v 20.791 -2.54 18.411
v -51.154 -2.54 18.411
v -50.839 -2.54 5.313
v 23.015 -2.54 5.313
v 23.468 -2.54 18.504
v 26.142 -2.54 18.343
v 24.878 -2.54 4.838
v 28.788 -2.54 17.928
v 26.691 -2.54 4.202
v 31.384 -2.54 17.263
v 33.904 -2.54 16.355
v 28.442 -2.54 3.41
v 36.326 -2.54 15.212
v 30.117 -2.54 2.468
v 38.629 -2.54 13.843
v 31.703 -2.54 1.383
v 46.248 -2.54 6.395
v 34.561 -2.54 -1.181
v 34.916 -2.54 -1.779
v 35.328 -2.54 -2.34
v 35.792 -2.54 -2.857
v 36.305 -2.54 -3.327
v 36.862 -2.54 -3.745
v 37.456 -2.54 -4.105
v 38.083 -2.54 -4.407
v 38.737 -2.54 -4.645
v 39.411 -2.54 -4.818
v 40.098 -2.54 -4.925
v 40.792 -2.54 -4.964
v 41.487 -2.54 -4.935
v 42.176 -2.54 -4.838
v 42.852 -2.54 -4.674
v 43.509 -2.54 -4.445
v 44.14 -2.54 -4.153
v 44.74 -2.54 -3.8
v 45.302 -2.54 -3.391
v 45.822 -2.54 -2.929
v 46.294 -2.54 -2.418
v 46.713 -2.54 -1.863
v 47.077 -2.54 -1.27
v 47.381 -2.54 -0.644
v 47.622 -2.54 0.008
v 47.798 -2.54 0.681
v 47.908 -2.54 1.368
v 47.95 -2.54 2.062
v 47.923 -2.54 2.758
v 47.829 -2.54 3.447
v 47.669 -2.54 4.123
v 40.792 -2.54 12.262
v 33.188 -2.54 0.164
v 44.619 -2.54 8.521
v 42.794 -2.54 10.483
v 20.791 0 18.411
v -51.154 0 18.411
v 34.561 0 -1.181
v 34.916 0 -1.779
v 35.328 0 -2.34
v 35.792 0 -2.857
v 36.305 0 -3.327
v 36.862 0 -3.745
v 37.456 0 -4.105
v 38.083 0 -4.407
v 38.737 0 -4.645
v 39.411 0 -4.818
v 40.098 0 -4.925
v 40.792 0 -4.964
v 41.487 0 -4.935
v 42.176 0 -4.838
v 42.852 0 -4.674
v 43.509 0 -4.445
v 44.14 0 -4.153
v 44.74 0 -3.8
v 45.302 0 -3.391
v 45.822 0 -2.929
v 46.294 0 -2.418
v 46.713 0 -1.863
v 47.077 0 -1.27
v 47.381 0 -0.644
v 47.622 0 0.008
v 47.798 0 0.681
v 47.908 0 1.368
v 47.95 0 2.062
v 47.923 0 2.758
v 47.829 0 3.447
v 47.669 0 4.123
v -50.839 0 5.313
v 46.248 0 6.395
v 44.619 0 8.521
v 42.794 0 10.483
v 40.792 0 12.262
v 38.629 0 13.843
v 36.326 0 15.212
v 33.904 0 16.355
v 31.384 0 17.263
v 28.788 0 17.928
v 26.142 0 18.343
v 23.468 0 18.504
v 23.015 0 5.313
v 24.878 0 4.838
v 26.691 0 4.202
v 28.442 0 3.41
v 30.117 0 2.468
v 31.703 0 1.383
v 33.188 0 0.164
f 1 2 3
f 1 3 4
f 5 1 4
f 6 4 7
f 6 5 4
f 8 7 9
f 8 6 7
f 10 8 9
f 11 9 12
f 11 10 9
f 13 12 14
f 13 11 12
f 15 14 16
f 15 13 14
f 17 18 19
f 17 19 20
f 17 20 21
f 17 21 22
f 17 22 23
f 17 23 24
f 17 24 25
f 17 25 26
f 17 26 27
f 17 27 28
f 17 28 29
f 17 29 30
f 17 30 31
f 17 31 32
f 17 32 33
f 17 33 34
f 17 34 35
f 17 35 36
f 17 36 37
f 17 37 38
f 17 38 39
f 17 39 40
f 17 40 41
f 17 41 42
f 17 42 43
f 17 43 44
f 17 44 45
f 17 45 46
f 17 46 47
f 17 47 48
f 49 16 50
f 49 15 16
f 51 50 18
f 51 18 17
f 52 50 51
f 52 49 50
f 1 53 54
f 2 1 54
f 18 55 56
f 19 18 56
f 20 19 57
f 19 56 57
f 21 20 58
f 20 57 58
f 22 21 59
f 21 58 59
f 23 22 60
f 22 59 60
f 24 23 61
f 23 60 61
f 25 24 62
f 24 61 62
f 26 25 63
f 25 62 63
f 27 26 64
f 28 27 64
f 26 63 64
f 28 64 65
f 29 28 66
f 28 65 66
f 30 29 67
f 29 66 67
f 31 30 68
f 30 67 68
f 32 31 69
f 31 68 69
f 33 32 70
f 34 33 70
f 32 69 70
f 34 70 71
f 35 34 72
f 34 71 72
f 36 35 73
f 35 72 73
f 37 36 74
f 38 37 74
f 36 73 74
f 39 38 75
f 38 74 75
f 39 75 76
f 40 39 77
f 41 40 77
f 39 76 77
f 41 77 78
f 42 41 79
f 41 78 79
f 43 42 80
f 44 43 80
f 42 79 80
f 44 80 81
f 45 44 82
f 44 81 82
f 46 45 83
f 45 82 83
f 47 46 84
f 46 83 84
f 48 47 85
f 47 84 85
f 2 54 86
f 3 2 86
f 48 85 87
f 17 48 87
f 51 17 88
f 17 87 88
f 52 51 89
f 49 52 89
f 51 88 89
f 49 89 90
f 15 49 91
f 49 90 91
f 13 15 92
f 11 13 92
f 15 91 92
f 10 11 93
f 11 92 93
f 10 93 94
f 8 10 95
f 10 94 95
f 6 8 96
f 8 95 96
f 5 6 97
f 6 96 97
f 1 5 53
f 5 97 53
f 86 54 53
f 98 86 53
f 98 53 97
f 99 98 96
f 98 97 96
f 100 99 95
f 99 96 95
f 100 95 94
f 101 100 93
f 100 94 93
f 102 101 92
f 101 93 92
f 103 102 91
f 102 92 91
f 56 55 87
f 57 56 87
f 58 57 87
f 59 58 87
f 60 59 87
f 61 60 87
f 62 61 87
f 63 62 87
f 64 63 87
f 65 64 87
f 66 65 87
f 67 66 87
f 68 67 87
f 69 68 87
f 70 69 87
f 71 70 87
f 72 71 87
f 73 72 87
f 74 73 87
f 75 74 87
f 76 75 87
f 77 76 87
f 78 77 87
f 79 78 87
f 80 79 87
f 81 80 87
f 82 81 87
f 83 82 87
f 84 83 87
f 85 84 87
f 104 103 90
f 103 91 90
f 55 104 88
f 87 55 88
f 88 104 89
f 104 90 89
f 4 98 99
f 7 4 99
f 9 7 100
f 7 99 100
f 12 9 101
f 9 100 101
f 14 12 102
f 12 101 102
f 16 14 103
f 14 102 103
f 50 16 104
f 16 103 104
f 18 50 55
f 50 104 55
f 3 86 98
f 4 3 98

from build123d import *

# Parameters (mm, degrees)
F1_DEPTH = 2.54


with BuildPart() as f1:
    # F0 (on Front) → F1 (new body)
    with BuildSketch(Plane.XZ):
        with BuildLine():
            Line((20.790566, 18.41102), (-51.154129, 18.41102))
            Line((-51.154129, 18.41102), (-50.838508, 5.312736))
            Line((-50.838508, 5.312736), (23.015394, 5.312736))
            ThreePointArc((23.015394, 5.312736), (29.289776, 2.957741), (34.560848, -1.18106))
            ThreePointArc((34.560848, -1.18106), (43.50892, -4.445038), (47.668573, 4.123442))
            ThreePointArc((47.668573, 4.123442), (36.326452, 15.211918), (20.790566, 18.41102))
        make_face()
    extrude(amount=F1_DEPTH)


solid = f1.part
